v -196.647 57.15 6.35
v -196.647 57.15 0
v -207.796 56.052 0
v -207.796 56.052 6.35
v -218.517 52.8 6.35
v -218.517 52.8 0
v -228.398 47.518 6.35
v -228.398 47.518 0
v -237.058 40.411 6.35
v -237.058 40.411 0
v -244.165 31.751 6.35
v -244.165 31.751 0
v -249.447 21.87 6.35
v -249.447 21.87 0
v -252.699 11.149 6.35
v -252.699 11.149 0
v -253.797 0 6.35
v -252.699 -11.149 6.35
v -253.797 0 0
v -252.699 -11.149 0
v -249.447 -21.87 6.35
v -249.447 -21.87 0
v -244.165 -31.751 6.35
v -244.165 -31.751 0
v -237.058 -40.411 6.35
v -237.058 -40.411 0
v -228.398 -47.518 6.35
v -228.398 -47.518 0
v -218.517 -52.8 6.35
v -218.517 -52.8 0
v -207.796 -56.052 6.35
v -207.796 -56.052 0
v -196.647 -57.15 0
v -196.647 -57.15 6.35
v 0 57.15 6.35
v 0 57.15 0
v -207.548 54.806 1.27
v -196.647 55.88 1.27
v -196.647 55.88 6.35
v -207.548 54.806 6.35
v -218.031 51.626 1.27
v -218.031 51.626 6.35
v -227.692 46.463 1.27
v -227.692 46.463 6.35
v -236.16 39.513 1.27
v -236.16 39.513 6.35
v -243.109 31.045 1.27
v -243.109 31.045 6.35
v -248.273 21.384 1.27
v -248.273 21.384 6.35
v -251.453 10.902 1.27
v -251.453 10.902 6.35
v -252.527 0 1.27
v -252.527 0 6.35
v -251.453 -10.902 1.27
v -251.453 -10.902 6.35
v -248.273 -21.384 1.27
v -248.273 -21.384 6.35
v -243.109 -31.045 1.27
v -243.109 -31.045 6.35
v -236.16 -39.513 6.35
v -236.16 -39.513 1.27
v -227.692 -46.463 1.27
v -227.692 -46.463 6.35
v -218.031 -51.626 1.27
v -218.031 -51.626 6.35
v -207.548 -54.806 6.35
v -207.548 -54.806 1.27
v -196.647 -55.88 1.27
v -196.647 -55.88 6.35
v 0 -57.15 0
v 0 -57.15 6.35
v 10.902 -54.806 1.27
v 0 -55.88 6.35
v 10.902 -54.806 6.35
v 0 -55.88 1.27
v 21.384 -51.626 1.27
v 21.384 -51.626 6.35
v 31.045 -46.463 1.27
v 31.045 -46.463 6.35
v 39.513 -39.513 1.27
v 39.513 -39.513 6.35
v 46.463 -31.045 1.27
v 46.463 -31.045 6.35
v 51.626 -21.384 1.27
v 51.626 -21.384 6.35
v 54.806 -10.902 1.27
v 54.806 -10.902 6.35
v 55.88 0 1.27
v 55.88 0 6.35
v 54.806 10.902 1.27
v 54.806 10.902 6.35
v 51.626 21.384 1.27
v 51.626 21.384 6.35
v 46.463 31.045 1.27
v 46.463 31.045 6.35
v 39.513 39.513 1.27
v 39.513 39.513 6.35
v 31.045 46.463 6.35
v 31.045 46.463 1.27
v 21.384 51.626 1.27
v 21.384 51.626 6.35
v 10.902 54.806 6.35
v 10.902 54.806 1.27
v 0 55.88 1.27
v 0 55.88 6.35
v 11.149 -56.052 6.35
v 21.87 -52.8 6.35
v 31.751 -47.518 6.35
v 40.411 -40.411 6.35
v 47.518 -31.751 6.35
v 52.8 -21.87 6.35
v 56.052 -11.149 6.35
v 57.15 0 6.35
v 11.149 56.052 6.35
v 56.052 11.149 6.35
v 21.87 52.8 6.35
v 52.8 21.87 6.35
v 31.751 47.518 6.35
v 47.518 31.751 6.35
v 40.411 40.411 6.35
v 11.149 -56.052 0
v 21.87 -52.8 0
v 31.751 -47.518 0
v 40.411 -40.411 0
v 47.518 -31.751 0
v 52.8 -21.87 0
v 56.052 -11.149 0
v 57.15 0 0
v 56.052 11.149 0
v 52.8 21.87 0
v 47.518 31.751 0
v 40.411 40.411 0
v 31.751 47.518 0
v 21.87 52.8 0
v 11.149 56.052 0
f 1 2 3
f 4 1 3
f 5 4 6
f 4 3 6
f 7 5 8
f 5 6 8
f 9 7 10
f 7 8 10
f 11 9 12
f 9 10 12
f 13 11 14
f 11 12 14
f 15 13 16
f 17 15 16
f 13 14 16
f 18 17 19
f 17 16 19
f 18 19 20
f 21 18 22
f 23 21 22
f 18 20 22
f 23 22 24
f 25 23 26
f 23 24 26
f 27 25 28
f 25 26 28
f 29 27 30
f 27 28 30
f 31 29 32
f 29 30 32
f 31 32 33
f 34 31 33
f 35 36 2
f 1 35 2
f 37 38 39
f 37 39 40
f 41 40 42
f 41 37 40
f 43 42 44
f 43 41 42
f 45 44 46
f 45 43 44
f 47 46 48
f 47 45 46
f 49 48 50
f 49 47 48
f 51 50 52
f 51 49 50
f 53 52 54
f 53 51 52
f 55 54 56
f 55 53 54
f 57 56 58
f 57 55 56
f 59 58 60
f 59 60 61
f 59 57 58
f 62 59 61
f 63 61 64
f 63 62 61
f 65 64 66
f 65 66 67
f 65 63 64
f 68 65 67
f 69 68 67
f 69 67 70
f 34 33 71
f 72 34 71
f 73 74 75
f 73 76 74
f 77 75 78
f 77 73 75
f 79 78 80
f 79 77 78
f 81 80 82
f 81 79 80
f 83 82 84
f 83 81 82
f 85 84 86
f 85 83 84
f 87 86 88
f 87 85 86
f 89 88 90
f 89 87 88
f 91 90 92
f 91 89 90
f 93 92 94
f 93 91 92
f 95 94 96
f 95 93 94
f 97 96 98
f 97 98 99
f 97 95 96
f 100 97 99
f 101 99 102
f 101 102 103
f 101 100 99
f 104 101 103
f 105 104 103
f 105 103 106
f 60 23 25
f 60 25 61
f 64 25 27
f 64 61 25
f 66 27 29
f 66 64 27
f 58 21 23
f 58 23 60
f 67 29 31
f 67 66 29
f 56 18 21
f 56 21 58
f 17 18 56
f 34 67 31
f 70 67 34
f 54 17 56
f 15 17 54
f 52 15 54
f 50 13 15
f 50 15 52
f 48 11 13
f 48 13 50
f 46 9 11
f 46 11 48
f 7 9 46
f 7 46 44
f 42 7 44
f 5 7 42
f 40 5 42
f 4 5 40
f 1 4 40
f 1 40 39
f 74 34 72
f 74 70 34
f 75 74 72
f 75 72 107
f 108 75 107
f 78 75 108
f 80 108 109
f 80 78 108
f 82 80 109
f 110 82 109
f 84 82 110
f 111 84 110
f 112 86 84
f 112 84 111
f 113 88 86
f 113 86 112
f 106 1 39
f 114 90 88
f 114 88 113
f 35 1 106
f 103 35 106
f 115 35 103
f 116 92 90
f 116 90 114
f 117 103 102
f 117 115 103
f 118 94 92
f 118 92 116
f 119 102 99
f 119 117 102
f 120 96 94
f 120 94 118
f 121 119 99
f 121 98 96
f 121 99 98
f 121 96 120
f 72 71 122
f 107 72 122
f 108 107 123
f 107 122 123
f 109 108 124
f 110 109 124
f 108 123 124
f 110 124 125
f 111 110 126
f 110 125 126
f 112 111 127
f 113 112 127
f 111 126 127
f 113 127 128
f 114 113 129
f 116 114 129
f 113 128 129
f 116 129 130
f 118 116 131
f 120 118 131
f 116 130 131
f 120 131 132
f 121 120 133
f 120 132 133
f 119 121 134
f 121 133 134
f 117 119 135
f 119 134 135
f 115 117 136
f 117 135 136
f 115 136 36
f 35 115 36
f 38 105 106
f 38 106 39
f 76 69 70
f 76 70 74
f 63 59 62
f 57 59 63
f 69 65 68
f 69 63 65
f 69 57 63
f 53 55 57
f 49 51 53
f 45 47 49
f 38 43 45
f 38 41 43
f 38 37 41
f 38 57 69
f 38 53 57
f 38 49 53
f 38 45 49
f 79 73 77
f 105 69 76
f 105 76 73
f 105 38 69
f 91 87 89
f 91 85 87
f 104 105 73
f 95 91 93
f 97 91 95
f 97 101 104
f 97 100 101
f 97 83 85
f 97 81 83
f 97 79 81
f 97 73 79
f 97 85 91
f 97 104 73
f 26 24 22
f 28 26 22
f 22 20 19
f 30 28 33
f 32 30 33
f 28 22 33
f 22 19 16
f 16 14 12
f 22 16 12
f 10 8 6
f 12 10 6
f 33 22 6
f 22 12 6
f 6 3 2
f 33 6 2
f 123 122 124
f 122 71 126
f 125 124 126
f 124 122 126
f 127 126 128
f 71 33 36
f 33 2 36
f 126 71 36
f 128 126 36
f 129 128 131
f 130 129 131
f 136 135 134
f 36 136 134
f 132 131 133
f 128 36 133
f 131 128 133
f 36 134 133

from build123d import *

# Parameters (mm, degrees)
F1_DEPTH = 6.35
F2_T     = -1.27


with BuildPart() as f1:
    # F0 (on Top) → F1 (new body)
    with BuildSketch(Plane.XY):
        with BuildLine():
            Line((0, 57.15), (-196.6468, 57.15))
            ThreePointArc((-196.6468, 57.15), (-253.7968, 0), (-196.6468, -57.15))
            Line((-196.6468, -57.15), (0, -57.15))
            ThreePointArc((0, -57.15), (57.15, 0), (0, 57.15))
        make_face()
    extrude(amount=F1_DEPTH)

    # F2
    f2_openings = [f1.faces().sort_by_distance(p)[0] for p in [
        (-98.3234, 0, 6.35),
    ]]
    offset(amount=F2_T, openings=f2_openings)


solid = f1.part
